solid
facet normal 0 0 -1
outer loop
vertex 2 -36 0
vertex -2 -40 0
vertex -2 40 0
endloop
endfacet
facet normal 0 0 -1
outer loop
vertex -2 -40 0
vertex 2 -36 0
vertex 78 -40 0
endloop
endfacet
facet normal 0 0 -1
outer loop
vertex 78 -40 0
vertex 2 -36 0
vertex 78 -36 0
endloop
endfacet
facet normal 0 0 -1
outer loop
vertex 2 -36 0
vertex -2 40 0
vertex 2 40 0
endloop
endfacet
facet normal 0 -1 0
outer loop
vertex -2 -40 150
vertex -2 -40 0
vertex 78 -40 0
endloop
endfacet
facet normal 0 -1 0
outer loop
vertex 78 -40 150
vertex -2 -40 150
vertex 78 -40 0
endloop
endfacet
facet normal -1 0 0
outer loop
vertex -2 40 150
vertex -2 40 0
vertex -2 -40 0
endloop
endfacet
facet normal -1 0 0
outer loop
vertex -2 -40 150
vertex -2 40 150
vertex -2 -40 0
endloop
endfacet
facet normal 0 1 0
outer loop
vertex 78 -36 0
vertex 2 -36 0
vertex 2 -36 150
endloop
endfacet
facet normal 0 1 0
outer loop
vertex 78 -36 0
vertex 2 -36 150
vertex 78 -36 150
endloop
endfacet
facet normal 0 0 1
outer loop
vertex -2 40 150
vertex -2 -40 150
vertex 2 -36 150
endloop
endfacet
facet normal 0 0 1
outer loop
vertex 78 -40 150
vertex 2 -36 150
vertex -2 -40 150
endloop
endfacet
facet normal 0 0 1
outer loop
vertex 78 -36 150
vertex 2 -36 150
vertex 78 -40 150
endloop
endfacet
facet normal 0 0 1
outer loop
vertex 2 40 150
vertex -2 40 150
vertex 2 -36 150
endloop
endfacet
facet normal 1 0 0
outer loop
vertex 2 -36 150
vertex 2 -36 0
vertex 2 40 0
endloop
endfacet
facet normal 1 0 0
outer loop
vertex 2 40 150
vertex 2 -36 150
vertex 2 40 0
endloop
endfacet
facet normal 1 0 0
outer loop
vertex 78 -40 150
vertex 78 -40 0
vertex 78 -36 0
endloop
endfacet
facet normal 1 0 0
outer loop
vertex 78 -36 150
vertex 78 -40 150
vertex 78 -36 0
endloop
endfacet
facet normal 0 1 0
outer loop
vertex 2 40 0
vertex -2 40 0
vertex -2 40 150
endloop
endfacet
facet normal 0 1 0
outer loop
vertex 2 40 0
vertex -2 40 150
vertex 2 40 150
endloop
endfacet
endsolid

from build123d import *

# Parameters (mm, degrees)
SKETCH1_W           = 4
SKETCH1_H           = 76
SKETCH1_H_2         = 4
SKETCH1_W_2         = 76
BOSS_EXTRUDE1_DEPTH = 150


with BuildPart() as part:
    # Sketch1 → Boss-Extrude1 (new body)
    with BuildSketch(Plane.XY):
        with Locations((0, 2)):
            Rectangle(SKETCH1_W, SKETCH1_H)
        with Locations((0, -38)):
            Rectangle(SKETCH1_W, SKETCH1_H_2)
        with Locations((40, -38)):
            Rectangle(SKETCH1_W_2, SKETCH1_H_2)
    extrude(amount=BOSS_EXTRUDE1_DEPTH)


solid = part.part
